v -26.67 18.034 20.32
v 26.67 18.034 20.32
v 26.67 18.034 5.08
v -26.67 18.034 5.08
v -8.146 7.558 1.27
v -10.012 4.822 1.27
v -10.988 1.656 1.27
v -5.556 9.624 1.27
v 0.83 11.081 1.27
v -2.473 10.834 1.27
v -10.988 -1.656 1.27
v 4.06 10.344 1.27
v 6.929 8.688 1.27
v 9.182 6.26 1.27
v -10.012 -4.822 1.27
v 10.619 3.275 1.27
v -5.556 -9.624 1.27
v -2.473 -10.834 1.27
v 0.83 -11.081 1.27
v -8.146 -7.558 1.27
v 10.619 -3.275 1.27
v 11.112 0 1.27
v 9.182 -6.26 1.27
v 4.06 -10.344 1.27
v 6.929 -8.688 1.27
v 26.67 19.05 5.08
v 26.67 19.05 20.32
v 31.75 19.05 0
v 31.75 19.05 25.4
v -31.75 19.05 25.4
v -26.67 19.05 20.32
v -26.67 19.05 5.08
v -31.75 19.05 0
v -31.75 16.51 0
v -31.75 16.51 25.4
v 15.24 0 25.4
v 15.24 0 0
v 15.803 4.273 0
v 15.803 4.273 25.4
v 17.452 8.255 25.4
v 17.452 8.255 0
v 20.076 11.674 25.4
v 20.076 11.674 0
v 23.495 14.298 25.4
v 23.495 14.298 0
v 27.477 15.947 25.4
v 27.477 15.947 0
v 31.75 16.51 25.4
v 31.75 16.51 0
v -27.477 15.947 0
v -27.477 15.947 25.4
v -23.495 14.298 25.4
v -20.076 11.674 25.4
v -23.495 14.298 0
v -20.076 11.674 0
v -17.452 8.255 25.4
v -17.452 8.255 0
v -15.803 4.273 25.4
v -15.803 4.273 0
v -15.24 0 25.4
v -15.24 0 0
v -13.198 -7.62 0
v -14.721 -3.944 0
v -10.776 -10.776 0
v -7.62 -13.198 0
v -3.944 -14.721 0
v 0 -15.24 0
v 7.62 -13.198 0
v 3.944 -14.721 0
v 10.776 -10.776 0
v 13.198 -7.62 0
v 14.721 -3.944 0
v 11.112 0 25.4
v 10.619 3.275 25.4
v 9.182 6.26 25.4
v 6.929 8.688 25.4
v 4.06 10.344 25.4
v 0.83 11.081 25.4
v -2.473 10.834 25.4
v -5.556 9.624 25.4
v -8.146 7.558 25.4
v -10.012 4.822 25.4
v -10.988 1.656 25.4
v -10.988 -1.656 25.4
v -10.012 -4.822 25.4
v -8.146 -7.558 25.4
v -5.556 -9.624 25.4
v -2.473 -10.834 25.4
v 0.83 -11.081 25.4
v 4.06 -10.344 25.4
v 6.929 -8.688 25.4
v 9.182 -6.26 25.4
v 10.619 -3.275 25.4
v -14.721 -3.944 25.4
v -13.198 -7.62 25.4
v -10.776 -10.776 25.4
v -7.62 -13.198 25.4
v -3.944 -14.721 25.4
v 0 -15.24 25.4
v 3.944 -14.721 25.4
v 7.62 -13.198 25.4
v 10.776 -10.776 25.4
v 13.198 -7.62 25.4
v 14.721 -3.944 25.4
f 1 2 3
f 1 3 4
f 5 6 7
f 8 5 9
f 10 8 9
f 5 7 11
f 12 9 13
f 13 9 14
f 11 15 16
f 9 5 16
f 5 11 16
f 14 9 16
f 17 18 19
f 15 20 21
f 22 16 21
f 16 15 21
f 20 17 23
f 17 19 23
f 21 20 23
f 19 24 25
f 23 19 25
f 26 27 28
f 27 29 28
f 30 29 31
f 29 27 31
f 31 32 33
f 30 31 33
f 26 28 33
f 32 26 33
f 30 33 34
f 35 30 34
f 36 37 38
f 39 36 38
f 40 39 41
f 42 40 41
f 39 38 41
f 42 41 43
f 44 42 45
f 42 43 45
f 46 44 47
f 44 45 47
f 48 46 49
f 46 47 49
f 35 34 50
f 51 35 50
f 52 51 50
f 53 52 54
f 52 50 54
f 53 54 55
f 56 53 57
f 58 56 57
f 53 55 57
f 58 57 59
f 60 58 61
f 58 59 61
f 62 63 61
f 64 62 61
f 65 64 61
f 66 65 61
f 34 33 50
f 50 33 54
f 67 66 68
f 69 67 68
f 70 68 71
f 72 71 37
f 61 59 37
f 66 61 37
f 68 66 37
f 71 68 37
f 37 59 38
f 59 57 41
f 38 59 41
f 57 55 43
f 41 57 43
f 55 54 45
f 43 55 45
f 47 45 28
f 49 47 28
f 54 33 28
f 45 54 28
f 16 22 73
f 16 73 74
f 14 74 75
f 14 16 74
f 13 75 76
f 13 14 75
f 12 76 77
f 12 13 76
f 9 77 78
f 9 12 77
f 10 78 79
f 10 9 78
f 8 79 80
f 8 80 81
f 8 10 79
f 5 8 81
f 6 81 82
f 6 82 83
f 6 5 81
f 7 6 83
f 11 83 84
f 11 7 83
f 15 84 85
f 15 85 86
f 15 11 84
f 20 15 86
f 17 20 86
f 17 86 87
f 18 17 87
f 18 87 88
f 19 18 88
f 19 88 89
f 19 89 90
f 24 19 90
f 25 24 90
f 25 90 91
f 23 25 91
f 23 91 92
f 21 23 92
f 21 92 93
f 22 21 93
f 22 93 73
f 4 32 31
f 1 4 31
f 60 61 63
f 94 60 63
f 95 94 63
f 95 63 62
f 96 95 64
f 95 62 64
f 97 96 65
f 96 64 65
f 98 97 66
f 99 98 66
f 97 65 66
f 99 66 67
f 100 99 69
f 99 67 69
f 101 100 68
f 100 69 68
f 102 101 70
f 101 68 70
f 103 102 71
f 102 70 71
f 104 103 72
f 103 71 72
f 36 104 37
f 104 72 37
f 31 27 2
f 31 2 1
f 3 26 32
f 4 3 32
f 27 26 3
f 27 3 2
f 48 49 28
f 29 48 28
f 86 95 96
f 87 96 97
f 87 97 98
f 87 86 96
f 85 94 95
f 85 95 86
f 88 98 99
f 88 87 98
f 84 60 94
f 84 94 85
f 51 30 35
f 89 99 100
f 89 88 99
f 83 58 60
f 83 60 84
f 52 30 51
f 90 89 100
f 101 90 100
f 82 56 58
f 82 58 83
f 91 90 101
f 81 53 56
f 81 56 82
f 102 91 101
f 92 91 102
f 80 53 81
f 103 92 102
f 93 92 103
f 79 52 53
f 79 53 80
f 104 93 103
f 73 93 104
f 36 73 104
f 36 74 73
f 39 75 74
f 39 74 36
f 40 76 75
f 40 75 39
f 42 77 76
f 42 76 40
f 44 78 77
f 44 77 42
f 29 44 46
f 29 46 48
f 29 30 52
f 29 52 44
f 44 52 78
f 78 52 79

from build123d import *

# Parameters (mm, degrees)
F0_R     = 11.1125
F1_DEPTH = 25.4
F2_R     = 15.24
F3_DEPTH = 1.27
F4_W     = 53.34
F4_H     = 15.24
F5_DEPTH = 1.016


with BuildPart() as f1:
    # F0 (on Top) → F1 (new body)
    with BuildSketch(Plane.XY):
        with BuildLine():
            ThreePointArc((-31.75, 16.51), (-20.075667, 11.674333), (-15.24, 0))
            ThreePointArc((-15.24, 0), (0, -15.24), (15.24, 0))
            ThreePointArc((15.24, 0), (20.075667, 11.674333), (31.75, 16.51))
            Line((31.75, 16.51), (31.75, 19.05))
            Line((31.75, 19.05), (-31.75, 19.05))
            Line((-31.75, 19.05), (-31.75, 16.51))
        make_face()
        Circle(F0_R, mode=Mode.SUBTRACT)
    extrude(amount=F1_DEPTH)

    # F2 (on face) → F3 (join)
    with BuildSketch(Plane(origin=(0, 0, 0), x_dir=(1, 0, 0), z_dir=(0, 0, -1))):
        Circle(F2_R)
    extrude(amount=-F3_DEPTH)

    # F4 (on face) → F5 (cut)
    with BuildSketch(Plane(origin=(0, 19.05, 0), x_dir=(-1, 0, 0), z_dir=(0, 1, 0))):
        with Locations((0, 12.7)):
            Rectangle(F4_W, F4_H)
    extrude(amount=-F5_DEPTH, mode=Mode.SUBTRACT)


solid = f1.part
